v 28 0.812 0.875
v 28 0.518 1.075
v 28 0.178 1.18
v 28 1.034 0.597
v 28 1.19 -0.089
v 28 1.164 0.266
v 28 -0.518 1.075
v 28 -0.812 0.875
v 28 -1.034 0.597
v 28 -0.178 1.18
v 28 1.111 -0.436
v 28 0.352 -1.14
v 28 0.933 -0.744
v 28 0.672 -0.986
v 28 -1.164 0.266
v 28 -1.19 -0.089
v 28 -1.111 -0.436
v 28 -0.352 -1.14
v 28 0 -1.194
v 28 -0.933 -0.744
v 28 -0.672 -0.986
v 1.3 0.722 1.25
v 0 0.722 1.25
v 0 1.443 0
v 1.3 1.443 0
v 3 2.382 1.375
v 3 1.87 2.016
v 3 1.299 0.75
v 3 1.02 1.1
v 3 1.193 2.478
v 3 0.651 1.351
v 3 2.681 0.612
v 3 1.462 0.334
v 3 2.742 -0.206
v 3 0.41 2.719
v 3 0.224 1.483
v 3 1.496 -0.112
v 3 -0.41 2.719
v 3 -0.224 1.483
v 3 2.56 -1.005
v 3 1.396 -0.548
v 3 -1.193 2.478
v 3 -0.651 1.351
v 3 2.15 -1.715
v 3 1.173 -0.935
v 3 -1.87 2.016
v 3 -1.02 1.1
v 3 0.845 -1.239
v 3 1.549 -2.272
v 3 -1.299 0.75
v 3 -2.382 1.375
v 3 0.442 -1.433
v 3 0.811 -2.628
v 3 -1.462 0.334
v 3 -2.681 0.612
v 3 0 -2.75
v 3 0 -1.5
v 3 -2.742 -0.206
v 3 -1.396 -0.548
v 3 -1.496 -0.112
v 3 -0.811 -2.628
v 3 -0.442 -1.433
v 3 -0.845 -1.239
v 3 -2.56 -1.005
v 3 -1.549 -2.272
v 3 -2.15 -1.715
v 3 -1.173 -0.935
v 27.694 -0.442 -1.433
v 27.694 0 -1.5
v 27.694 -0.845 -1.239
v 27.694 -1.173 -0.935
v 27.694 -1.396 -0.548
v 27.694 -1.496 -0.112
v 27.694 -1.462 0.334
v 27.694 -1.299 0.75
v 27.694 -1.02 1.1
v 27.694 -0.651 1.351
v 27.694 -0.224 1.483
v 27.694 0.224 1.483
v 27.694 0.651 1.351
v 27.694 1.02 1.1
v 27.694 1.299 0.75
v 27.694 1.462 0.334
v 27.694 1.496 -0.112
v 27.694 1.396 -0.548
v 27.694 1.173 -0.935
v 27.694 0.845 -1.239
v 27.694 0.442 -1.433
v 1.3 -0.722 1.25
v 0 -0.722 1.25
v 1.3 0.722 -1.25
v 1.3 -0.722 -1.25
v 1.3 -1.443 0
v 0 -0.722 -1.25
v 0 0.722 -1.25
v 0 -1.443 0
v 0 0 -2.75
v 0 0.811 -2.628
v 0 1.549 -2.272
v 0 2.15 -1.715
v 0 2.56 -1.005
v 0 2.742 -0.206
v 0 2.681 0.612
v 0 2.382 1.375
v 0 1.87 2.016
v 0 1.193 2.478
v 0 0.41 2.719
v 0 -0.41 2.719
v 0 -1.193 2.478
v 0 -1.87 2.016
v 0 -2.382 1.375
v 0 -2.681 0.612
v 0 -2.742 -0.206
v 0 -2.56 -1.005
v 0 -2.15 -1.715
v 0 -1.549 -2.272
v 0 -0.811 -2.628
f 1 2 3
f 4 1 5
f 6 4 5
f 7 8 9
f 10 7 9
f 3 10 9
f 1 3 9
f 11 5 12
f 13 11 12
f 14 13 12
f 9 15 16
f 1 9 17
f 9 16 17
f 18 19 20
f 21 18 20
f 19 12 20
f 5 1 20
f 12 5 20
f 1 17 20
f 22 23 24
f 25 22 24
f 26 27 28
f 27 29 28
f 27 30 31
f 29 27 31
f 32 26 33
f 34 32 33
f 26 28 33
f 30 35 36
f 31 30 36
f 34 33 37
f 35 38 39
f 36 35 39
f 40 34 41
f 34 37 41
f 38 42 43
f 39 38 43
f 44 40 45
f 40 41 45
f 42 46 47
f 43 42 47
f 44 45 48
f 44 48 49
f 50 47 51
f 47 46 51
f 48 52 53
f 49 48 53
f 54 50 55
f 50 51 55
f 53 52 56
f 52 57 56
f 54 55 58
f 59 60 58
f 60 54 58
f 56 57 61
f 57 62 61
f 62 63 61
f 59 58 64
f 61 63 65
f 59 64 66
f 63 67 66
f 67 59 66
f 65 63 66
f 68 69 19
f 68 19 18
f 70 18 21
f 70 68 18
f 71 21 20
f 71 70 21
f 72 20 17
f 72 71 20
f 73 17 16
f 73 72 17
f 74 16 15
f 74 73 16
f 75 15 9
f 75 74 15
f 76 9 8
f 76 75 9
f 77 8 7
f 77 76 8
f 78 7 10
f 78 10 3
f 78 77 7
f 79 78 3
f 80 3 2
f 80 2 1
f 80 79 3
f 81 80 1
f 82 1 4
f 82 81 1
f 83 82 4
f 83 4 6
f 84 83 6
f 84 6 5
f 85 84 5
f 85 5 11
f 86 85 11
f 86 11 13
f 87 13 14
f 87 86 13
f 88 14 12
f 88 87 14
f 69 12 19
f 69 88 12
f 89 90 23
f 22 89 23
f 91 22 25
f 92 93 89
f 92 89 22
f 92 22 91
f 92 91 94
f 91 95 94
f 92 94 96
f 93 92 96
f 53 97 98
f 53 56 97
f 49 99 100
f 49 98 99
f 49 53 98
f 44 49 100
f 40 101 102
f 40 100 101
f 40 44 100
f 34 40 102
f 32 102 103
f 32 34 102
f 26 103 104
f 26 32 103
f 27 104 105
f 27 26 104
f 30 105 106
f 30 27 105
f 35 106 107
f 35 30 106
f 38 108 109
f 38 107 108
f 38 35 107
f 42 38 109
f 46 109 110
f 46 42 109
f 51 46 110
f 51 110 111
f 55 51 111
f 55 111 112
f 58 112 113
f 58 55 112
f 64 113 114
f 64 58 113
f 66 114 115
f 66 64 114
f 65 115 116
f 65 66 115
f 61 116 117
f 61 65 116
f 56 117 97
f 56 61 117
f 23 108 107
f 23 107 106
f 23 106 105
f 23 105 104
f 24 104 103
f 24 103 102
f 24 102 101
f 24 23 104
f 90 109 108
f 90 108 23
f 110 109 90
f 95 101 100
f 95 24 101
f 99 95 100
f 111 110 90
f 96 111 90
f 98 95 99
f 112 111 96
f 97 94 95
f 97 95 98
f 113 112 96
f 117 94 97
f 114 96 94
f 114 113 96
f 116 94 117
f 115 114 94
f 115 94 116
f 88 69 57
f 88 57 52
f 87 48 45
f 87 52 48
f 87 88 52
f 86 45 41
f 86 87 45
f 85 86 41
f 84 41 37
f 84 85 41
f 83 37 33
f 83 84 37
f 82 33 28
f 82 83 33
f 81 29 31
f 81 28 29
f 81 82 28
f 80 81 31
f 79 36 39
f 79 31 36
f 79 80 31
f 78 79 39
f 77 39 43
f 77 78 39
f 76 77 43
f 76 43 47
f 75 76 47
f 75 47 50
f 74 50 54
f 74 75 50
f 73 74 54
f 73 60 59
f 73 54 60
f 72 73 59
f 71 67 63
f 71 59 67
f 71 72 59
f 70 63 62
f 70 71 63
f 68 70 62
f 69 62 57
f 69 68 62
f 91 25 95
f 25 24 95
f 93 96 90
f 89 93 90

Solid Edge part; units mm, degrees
sketch "Sketch1" plane through (0, 0, 0) normal (0, -1, 0) x (1, 0, 0)
  line L0 (0, 0) -> (0, -2.75)
  line L1 (0, -2.75) -> (3, -2.75)
  line L2 (3, -2.75) -> (3, -1.5)
  line L3 (3, -1.5) -> (27.6935, -1.5)
  line L4 (27.6935, -1.5) -> (28, -1.1935)
  line L5 (28, -1.1935) -> (28, 0)
  line L6 (28, 0) -> (0, 0)
revolve "RevolvedProtrusion1" add sketch "Sketch1" angle 360 about axis through (28, 0, 0) along (-1, 0, 0)
cosmetic_thread "Thread1" size "M3"
sketch "Sketch2" plane through (0, 0, 0) normal (-1, 0, 0) x (0, -1, 0)
  line L0 (-0.7217, 1.25) -> (-1.4434, 0)
  line L1 (-1.4434, 0) -> (-0.7217, -1.25)
  line L2 (-0.7217, -1.25) -> (0.7217, -1.25)
  line L3 (0.7217, -1.25) -> (1.4434, 0)
  line L4 (1.4434, 0) -> (0.7217, 1.25)
  line L5 (0.7217, 1.25) -> (-0.7217, 1.25)
extrude "ExtrudedCutout_1" cut sketch "Sketch2" against normal blind 1.3
properties part number "CQ-M3X25L"
